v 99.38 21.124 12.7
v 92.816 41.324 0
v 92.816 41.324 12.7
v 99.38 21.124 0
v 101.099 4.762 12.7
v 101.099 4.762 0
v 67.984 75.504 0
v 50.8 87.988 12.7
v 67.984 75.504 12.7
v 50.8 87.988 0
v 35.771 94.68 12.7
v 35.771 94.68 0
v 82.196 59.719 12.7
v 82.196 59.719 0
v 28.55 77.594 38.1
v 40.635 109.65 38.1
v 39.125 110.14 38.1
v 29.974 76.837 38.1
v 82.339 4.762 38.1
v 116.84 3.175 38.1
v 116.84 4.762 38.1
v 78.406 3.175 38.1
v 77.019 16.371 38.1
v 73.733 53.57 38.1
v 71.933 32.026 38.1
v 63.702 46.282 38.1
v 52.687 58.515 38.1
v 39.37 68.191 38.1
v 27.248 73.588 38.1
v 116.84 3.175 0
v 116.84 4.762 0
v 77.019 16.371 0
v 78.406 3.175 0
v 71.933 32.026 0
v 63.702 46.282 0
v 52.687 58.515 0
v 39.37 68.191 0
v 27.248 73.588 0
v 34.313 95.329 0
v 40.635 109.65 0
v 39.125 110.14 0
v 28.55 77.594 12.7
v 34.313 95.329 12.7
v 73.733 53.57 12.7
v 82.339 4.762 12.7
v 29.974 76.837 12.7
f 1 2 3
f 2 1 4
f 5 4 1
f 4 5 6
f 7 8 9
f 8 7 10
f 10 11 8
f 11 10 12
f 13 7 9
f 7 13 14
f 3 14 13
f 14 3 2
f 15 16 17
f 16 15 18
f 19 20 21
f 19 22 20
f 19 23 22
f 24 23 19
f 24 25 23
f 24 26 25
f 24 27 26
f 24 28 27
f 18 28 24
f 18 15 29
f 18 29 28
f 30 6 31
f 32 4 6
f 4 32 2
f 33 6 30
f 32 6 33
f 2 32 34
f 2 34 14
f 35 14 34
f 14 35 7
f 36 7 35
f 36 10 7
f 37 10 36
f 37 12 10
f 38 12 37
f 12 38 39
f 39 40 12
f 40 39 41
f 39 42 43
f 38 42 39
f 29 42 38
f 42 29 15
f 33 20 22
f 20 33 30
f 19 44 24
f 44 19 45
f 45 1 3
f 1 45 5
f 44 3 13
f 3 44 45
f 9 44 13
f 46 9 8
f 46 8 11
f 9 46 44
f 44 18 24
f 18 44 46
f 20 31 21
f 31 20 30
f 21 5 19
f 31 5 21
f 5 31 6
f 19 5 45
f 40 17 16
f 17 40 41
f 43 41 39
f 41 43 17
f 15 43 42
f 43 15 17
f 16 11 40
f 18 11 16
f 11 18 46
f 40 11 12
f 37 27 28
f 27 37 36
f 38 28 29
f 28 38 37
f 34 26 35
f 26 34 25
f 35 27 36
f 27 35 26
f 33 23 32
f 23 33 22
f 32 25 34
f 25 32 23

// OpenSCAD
mm2in=25.4;

module round_clamp_jig(wood_size=0.25*mm2in, inner=3.1*mm2in, thickness=0.9*mm2in, base=.125*mm2in, angle=72, offset=10, height=1.5*mm2in,
reinforcement=mm2in) {
 
    outer=thickness+inner;
    
    difference () {
        union() {
            difference () {
                cylinder(h=1.5*mm2in, r=outer);
                rotate([0, 0, angle])
                    translate([0, -wood_size/2, 0]) 
                    cube([inner+3*mm2in, wood_size, height]);
                translate([0, -wood_size/2, 0])
                    cube([inner+3*mm2in, wood_size, height]);
                rotate([0, 0, offset])
                    color("blue") 
                    translate([inner+thickness/2+base, 0, mm2in])
                    cube([thickness, inner+3*mm2in, mm2in], center=true);
                rotate([0, 0, angle-offset])
                    color("blue") 
                    translate([inner+thickness/2+base, 0, mm2in])
                    cube([thickness, inner+3*mm2in, mm2in], center=true);

            }

            translate([0, wood_size/2, 0])color("red")cube([inner+height, .0625*mm2in, height]);
            rotate([0, 0, angle])translate([0, -wood_size/2-0.0625*mm2in, 0])color("red")cube([inner+height, .0625*mm2in, height]);
        }

        cylinder(h=height, r=inner);

        translate([0, -outer/2, 0.75*mm2in])cube([2*outer, outer, height], center=true);

        rotate([0, 0, angle+180]) translate([0, -outer/2, 0.75*mm2in])cube([2*outer, outer, height], center=true);

    }
}
round_clamp_jig();
